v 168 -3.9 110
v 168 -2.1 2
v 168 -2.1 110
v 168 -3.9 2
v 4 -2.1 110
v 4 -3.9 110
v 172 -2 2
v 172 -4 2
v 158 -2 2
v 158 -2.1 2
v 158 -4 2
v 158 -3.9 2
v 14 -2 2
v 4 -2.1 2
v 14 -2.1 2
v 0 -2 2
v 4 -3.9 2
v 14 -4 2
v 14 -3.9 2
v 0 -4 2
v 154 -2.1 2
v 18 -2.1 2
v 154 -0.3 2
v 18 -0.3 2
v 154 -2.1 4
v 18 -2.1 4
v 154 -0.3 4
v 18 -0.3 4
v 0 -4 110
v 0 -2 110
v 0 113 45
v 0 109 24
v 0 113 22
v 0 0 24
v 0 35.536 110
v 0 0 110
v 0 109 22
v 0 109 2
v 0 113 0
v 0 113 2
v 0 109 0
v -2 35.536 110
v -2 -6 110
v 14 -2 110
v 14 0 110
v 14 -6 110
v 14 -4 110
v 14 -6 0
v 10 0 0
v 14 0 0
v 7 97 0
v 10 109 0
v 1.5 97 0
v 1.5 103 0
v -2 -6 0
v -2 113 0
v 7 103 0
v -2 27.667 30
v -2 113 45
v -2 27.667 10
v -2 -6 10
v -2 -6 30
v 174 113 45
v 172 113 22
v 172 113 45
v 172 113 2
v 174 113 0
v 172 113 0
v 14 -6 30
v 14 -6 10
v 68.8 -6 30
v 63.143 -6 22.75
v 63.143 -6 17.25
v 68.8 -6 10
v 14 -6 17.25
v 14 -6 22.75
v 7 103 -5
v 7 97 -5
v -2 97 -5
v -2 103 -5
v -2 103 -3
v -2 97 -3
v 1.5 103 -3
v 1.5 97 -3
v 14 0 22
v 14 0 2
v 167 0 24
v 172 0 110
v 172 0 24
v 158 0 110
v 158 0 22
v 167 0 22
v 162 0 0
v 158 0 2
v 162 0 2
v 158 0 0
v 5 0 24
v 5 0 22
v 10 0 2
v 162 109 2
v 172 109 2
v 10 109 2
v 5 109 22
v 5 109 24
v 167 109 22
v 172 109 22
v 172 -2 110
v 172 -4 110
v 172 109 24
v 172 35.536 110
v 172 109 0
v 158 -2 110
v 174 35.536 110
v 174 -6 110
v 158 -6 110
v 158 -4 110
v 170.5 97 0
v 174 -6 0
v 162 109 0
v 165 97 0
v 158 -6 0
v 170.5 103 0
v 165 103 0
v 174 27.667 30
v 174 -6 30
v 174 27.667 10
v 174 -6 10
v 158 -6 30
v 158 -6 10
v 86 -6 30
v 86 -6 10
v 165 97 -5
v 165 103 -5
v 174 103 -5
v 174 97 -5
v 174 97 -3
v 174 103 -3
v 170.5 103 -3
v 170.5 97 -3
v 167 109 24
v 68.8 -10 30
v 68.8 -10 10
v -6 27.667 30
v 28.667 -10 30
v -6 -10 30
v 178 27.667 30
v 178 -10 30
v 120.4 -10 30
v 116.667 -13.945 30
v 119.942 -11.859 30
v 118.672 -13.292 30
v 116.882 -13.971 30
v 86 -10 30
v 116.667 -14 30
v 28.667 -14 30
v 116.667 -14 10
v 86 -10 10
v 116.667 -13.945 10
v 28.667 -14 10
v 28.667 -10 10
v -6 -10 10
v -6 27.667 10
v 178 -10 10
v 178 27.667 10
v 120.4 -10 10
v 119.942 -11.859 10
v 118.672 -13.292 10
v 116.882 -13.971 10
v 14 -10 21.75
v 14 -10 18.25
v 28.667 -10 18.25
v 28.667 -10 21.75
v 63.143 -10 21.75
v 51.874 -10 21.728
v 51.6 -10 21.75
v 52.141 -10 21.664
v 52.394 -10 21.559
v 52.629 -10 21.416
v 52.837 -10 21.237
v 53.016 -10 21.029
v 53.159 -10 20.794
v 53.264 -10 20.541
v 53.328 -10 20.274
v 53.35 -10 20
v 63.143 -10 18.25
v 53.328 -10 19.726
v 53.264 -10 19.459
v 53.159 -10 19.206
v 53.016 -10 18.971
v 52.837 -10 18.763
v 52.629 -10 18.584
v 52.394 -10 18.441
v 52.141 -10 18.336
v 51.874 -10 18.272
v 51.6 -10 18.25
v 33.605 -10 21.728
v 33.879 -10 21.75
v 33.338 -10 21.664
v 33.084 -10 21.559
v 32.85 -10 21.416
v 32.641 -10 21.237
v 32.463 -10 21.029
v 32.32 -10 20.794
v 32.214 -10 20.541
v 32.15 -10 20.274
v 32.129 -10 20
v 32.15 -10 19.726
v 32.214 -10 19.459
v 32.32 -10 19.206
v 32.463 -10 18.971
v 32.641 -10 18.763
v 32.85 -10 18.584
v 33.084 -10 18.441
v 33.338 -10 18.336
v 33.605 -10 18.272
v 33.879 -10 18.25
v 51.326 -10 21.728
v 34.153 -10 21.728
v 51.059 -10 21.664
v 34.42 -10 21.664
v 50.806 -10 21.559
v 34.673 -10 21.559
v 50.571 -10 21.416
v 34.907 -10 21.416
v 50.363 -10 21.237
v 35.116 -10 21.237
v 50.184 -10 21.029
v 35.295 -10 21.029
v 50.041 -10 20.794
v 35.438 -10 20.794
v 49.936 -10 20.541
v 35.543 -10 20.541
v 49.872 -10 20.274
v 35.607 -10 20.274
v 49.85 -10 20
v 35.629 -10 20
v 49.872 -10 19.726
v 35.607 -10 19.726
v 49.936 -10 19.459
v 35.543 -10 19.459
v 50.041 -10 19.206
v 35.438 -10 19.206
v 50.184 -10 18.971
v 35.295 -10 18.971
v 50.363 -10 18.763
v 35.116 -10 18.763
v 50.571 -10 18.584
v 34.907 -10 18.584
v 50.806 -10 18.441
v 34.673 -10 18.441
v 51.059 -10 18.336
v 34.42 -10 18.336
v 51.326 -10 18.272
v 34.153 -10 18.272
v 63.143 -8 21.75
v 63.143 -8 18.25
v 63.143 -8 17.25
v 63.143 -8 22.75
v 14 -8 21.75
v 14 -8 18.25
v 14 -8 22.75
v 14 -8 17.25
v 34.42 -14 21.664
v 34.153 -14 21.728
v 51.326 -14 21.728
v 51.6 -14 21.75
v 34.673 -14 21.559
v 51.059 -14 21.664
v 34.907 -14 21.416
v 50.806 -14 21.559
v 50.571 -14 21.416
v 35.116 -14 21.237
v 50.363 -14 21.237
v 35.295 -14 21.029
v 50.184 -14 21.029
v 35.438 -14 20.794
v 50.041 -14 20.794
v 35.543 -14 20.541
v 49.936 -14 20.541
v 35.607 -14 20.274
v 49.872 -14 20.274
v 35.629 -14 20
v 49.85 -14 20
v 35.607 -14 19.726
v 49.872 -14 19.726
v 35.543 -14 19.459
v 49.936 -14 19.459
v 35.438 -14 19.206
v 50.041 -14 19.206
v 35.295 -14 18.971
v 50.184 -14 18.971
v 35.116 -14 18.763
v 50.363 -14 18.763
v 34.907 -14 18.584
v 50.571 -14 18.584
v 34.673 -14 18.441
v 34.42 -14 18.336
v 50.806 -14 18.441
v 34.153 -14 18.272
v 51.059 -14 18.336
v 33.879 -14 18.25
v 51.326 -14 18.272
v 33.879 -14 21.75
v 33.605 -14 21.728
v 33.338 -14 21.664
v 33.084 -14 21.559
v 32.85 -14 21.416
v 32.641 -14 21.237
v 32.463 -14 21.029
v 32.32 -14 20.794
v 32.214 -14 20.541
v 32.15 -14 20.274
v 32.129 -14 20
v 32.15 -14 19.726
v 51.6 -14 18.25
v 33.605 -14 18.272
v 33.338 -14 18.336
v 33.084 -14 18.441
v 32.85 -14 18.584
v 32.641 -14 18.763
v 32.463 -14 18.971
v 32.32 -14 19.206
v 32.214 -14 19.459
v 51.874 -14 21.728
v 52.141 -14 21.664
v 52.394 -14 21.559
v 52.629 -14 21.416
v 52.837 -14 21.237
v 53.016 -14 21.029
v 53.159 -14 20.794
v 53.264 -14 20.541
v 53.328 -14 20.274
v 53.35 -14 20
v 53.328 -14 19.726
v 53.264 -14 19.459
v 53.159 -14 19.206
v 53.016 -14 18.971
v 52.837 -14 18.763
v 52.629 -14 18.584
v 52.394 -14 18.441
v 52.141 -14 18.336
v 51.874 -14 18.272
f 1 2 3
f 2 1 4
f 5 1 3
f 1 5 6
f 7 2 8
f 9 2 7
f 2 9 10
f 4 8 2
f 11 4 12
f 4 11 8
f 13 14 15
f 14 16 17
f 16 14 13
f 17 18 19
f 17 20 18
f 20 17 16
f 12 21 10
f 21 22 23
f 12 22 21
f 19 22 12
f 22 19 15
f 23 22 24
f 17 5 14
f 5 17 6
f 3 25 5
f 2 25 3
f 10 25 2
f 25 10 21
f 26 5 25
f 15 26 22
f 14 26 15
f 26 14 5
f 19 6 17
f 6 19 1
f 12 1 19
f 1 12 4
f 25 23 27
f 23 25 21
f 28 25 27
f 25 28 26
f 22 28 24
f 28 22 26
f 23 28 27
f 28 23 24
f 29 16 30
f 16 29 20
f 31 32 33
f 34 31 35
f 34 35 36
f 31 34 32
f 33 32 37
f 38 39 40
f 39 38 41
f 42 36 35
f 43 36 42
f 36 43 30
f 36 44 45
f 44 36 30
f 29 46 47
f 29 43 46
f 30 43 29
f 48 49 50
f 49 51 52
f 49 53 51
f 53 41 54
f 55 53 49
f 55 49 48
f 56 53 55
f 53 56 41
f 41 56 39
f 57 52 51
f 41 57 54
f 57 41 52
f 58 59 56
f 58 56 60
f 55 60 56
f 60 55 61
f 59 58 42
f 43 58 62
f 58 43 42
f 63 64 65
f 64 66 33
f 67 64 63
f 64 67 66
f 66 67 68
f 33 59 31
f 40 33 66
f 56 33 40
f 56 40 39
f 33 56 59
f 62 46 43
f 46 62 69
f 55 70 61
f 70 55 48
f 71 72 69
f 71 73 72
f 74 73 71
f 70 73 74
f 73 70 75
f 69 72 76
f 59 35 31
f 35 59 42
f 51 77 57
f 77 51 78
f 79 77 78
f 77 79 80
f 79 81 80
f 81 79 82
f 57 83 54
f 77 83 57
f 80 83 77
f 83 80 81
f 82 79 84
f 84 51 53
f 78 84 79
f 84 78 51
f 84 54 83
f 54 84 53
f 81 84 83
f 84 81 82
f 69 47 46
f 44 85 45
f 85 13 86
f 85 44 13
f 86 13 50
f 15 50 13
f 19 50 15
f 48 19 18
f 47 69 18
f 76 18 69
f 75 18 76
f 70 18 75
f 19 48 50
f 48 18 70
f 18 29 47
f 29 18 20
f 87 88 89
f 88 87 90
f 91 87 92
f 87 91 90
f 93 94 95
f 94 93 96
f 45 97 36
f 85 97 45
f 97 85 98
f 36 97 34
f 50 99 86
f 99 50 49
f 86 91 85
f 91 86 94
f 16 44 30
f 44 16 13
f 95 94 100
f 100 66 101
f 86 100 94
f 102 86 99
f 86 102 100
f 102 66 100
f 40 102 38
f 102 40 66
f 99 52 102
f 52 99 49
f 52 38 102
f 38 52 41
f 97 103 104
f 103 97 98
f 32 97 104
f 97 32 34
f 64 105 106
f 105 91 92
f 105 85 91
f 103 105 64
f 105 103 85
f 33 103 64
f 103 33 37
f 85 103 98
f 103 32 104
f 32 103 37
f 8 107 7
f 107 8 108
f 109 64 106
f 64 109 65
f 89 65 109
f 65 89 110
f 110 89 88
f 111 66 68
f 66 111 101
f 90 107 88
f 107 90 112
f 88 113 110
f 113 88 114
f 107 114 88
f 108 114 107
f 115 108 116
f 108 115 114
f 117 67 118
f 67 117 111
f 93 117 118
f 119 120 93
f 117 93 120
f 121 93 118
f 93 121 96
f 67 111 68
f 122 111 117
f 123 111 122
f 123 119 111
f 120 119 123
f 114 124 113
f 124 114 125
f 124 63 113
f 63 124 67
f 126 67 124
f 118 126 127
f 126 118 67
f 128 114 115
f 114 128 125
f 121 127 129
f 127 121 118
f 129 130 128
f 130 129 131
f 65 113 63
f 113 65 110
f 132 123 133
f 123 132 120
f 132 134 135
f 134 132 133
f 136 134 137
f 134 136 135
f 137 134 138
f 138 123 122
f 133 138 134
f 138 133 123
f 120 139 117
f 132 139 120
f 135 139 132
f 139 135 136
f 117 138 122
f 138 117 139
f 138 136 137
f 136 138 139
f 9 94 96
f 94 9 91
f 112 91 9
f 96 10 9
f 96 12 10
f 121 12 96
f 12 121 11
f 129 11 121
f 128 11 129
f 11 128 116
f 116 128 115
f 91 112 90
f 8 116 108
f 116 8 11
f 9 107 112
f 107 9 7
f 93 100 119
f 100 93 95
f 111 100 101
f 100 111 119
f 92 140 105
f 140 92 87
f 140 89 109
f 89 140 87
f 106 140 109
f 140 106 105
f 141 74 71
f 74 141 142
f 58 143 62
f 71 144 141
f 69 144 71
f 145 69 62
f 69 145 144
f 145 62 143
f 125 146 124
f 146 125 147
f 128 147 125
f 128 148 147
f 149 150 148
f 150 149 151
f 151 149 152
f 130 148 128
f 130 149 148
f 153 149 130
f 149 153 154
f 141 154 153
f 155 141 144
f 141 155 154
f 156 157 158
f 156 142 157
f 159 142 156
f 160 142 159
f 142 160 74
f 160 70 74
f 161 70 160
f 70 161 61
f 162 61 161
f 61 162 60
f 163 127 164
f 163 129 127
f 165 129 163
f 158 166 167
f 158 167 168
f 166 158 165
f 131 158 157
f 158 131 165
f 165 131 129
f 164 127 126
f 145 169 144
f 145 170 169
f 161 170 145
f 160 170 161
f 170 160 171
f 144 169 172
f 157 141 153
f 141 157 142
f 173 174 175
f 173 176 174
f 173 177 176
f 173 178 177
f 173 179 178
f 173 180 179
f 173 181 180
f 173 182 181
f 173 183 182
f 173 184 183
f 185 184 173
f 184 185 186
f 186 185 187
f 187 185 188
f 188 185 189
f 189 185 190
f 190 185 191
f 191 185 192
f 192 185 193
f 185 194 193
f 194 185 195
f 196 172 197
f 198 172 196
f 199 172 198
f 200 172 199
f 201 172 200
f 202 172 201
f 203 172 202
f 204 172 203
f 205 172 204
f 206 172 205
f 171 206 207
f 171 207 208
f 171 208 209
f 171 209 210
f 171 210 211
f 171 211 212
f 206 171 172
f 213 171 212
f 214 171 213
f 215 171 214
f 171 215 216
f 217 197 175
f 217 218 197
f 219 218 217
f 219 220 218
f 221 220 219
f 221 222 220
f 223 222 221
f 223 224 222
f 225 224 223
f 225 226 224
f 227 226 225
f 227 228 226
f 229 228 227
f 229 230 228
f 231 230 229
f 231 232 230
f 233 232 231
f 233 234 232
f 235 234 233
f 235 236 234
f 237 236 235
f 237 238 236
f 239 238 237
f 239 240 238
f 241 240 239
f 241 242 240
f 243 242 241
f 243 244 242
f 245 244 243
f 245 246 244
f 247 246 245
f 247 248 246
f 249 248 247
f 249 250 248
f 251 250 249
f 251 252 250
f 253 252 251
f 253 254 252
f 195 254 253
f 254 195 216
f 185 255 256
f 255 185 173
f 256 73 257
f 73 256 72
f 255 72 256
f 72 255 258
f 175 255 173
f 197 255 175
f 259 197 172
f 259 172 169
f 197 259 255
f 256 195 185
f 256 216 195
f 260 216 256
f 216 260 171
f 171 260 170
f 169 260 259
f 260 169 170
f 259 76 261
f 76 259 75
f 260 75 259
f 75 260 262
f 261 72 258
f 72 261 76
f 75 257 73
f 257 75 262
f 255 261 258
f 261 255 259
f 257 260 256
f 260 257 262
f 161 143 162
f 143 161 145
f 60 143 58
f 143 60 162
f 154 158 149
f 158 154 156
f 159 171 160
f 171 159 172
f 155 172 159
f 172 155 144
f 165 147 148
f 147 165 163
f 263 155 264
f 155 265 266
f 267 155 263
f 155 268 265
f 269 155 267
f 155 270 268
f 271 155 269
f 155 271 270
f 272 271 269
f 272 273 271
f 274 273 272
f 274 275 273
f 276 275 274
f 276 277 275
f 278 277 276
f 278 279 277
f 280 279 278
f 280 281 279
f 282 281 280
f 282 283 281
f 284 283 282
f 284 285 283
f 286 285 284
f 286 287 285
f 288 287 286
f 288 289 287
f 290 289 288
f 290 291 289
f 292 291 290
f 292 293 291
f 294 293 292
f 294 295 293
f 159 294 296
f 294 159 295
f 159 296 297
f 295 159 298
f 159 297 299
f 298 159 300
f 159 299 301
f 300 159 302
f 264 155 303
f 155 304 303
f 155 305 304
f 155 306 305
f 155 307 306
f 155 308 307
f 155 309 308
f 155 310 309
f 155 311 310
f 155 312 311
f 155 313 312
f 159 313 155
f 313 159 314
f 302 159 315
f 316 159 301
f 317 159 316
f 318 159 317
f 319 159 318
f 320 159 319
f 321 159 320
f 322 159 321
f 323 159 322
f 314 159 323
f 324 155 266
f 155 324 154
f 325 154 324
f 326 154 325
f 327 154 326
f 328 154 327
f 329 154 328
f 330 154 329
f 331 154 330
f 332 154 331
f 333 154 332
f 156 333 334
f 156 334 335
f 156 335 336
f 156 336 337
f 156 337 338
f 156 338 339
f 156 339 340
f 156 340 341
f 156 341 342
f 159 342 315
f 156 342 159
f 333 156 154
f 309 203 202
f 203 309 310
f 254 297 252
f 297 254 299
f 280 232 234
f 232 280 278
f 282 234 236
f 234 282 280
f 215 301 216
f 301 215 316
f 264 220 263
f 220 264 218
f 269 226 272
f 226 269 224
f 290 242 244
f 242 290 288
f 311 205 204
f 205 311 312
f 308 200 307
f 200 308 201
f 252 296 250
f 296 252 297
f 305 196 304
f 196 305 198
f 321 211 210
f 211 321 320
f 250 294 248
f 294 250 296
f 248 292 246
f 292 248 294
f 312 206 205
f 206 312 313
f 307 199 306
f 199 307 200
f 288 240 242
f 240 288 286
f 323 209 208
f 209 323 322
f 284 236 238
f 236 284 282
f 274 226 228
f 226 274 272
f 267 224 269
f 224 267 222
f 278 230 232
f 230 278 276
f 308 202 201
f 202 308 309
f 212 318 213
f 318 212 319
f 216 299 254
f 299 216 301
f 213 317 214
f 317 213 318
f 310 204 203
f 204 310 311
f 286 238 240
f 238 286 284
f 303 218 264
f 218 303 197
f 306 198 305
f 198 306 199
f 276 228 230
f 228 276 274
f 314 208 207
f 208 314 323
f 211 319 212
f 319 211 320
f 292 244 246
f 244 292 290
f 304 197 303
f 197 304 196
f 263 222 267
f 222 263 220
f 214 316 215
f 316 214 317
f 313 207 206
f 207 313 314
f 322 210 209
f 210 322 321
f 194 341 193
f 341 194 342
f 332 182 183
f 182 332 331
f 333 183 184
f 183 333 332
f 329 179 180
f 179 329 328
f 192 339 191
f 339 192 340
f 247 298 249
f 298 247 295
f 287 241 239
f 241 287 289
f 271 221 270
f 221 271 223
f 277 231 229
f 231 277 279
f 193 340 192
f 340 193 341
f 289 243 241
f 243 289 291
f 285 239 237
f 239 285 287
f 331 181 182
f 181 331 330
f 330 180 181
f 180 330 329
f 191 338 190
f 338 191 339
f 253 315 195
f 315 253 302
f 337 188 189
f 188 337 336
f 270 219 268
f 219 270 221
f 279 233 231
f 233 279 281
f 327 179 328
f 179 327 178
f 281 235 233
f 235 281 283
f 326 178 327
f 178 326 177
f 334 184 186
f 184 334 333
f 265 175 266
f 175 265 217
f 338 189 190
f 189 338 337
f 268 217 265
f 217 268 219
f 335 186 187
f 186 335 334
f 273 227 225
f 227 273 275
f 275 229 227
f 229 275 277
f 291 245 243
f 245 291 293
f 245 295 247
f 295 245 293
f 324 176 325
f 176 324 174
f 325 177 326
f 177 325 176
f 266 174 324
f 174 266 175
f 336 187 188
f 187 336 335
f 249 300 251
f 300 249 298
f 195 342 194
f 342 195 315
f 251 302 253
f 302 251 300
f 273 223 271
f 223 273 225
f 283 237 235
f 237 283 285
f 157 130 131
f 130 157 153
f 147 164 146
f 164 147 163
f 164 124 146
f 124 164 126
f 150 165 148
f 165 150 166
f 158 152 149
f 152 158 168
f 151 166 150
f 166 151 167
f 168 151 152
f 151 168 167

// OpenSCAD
/* [Monitor] */

Monitor_Width = 172;
Monitor_Height = 113;
Monitor_Depth = 20;

/* [Shield] */

// Which part would you like to see?
part = 6;  //[1:Top, 2:Left Side, 3:Right Side, 4:Clip Part 1, 5:Clip part 2, 6:Everything togheter]

// Shield Height
Shield_Height = 90; // [60:150]
// Because of my printer´s limitation, i had to limit the width of the top cover, use this to configure it
Shield_Cover_Width = 164;
Monitor_Top_Lock_Tab_Width = 5;
Monitor_Bottom_Lock_Tab_Width = 10;
// Tickness of all walls, 2 is good enough
Shield_Tickness = 2; //[2:4]

/* [Hidden] */

lockerSize = 14;
clipHeight = 20;
screwDiameter = 3.5;
screwCapDiameter = 5.5;

if(part < 6){
/*
Use this function to export the parts
1 = Top;
2 = Left Side;
3 = Right Side;
4 = Clip Part 1;
3 = Clip part 2;
*/
print(part);
}else{
// Use this function to see how everything looks like togheter 
BuildEverythings();
}



module print(piece){
    if (piece == 1)
        rotate([90,0,0]) top();
    
    if (piece == 2)
        rotate([0,90,0]) left();
    
    if (piece == 3)
        rotate([0,-90,0]) right();
    
    if (piece == 4)
        clipLeft();
   
    if (piece == 5)
        clipRight();
}

module BuildEverythings(){
#translate([0,0,Shield_Tickness]) monitor();
color([0.5,0.5,1]) translate([4,-Shield_Tickness * 2 + Shield_Tickness * 0.05,Shield_Tickness]) top();
color([0.2,0.5,0.6]) translate([-Shield_Tickness,-Shield_Tickness * 3,0]) right();
color([0.2,0.5,0.6]) translate([Monitor_Width + Shield_Tickness,-Shield_Tickness * 3,0]) left();
    translate([-(Shield_Tickness * 3),-(Shield_Tickness * 5),10]) adjustableClips();
}

module monitor(){
    cube([Monitor_Width, Monitor_Height,Monitor_Depth]);
}

module top(){
    cube([Shield_Cover_Width,Shield_Tickness * 0.9,Shield_Height + Monitor_Depth - Shield_Tickness]);
    translate([lockerSize,Shield_Tickness * 0.90,0]) cube([Shield_Cover_Width - lockerSize * 2,Shield_Tickness * 0.9, Shield_Tickness]);
}

module right(){
    difference(){
        cube([Shield_Tickness,Monitor_Height + Shield_Tickness * 3,Shield_Height + Monitor_Depth]);
        translate([-0.5,Monitor_Height + Shield_Tickness * 3,Monitor_Depth + Shield_Height/2 - 20]) rotate([50,0,0])  cube([Shield_Tickness+1, Monitor_Height, Shield_Height * 3]);
    }
    
    // Top lockers
    translate([Shield_Tickness,0,0]) cube([lockerSize,Shield_Tickness,Shield_Height + Monitor_Depth]);
    translate([Shield_Tickness,Shield_Tickness * 2,0]) cube([lockerSize,Shield_Tickness,Shield_Height + Monitor_Depth]);
    translate([Shield_Tickness,Shield_Tickness,0]) cube([lockerSize,Shield_Tickness,Shield_Tickness]);
    
    // Monitor Lockers
    translate([Shield_Tickness,Shield_Tickness,0]) cube([Monitor_Bottom_Lock_Tab_Width,Monitor_Height,Shield_Tickness]);
    translate([Shield_Tickness,Shield_Tickness * 2,Monitor_Depth + Shield_Tickness]) cube([Monitor_Top_Lock_Tab_Width,Monitor_Height - Shield_Tickness,Shield_Tickness]);
    
    // Rubber locker
    difference(){
        translate([0,Monitor_Height - 10,-5]) cube([9,6,5]);
        translate([-0.5,Monitor_Height - 10.5,-3]) cube([4,7,5.5]);
    }
}

module left(){
    mirror([1,0,0]) right();
}

module adjustableClips(){
   
   clipRight();
   translate([(Monitor_Width -  Monitor_Width / 2 + Shield_Tickness * 3) ,0,0])clipLeft();
   
}

module clipLeft(){
        cube([Monitor_Width / 2 +Shield_Tickness , Shield_Tickness * 2, clipHeight]);
    translate([Monitor_Width / 2 +Shield_Tickness ,0,0])  cube([Shield_Tickness * 2, Monitor_Height/3, clipHeight]) ; 
    difference(){
        translate([-(Monitor_Width / 3),-(Shield_Tickness * 2),0]) cube([Monitor_Width / 2 +Shield_Tickness , Shield_Tickness * 2, clipHeight]);
    
        translate([-(Monitor_Width / 3.3),0.5,clipHeight/2]) rotate([90,0,0]) cylinder(d = screwDiameter, h = Shield_Tickness * 2 + 1, $fn = 40) ;
        
        translate([-(Monitor_Width / 5),0.5,clipHeight/2]) rotate([90,0,0]) cylinder(d = screwDiameter, h = Shield_Tickness * 2 + 1, $fn = 40) ;
    }
    translate([Monitor_Width / 5 - Shield_Tickness * 2,0,0]) cylinder(h= clipHeight, r= Shield_Tickness * 2);
}

module clipRight(){
    difference(){
        translate([Shield_Tickness * 2,0,0]) cube([Monitor_Width / 2.5 + Shield_Tickness , Shield_Tickness * 2, clipHeight]) ;
        
    translate([20,-0.5,(clipHeight - screwDiameter) / 2 ]) cube([Monitor_Width / 3.5,Shield_Tickness * 2 + 1, screwDiameter]);
        
        translate([20,Shield_Tickness * 2 - 2,(clipHeight - screwCapDiameter) / 2 ]) cube([Monitor_Width / 3.5,2.1, screwCapDiameter]);
    }
    cube([Shield_Tickness * 2, Monitor_Height/3, clipHeight]) ;
}

module roundedcube(xdim ,ydim ,zdim,rdim){
hull(){
translate([rdim,rdim,0])cylinder(h=zdim,r=rdim);
translate([xdim-rdim,rdim,0])cylinder(h=zdim,r=rdim);

translate([rdim,ydim-rdim,0])cylinder(h=zdim,r=rdim);
translate([xdim-rdim,ydim-rdim,0])cylinder(h=zdim,r=rdim);
}
}
